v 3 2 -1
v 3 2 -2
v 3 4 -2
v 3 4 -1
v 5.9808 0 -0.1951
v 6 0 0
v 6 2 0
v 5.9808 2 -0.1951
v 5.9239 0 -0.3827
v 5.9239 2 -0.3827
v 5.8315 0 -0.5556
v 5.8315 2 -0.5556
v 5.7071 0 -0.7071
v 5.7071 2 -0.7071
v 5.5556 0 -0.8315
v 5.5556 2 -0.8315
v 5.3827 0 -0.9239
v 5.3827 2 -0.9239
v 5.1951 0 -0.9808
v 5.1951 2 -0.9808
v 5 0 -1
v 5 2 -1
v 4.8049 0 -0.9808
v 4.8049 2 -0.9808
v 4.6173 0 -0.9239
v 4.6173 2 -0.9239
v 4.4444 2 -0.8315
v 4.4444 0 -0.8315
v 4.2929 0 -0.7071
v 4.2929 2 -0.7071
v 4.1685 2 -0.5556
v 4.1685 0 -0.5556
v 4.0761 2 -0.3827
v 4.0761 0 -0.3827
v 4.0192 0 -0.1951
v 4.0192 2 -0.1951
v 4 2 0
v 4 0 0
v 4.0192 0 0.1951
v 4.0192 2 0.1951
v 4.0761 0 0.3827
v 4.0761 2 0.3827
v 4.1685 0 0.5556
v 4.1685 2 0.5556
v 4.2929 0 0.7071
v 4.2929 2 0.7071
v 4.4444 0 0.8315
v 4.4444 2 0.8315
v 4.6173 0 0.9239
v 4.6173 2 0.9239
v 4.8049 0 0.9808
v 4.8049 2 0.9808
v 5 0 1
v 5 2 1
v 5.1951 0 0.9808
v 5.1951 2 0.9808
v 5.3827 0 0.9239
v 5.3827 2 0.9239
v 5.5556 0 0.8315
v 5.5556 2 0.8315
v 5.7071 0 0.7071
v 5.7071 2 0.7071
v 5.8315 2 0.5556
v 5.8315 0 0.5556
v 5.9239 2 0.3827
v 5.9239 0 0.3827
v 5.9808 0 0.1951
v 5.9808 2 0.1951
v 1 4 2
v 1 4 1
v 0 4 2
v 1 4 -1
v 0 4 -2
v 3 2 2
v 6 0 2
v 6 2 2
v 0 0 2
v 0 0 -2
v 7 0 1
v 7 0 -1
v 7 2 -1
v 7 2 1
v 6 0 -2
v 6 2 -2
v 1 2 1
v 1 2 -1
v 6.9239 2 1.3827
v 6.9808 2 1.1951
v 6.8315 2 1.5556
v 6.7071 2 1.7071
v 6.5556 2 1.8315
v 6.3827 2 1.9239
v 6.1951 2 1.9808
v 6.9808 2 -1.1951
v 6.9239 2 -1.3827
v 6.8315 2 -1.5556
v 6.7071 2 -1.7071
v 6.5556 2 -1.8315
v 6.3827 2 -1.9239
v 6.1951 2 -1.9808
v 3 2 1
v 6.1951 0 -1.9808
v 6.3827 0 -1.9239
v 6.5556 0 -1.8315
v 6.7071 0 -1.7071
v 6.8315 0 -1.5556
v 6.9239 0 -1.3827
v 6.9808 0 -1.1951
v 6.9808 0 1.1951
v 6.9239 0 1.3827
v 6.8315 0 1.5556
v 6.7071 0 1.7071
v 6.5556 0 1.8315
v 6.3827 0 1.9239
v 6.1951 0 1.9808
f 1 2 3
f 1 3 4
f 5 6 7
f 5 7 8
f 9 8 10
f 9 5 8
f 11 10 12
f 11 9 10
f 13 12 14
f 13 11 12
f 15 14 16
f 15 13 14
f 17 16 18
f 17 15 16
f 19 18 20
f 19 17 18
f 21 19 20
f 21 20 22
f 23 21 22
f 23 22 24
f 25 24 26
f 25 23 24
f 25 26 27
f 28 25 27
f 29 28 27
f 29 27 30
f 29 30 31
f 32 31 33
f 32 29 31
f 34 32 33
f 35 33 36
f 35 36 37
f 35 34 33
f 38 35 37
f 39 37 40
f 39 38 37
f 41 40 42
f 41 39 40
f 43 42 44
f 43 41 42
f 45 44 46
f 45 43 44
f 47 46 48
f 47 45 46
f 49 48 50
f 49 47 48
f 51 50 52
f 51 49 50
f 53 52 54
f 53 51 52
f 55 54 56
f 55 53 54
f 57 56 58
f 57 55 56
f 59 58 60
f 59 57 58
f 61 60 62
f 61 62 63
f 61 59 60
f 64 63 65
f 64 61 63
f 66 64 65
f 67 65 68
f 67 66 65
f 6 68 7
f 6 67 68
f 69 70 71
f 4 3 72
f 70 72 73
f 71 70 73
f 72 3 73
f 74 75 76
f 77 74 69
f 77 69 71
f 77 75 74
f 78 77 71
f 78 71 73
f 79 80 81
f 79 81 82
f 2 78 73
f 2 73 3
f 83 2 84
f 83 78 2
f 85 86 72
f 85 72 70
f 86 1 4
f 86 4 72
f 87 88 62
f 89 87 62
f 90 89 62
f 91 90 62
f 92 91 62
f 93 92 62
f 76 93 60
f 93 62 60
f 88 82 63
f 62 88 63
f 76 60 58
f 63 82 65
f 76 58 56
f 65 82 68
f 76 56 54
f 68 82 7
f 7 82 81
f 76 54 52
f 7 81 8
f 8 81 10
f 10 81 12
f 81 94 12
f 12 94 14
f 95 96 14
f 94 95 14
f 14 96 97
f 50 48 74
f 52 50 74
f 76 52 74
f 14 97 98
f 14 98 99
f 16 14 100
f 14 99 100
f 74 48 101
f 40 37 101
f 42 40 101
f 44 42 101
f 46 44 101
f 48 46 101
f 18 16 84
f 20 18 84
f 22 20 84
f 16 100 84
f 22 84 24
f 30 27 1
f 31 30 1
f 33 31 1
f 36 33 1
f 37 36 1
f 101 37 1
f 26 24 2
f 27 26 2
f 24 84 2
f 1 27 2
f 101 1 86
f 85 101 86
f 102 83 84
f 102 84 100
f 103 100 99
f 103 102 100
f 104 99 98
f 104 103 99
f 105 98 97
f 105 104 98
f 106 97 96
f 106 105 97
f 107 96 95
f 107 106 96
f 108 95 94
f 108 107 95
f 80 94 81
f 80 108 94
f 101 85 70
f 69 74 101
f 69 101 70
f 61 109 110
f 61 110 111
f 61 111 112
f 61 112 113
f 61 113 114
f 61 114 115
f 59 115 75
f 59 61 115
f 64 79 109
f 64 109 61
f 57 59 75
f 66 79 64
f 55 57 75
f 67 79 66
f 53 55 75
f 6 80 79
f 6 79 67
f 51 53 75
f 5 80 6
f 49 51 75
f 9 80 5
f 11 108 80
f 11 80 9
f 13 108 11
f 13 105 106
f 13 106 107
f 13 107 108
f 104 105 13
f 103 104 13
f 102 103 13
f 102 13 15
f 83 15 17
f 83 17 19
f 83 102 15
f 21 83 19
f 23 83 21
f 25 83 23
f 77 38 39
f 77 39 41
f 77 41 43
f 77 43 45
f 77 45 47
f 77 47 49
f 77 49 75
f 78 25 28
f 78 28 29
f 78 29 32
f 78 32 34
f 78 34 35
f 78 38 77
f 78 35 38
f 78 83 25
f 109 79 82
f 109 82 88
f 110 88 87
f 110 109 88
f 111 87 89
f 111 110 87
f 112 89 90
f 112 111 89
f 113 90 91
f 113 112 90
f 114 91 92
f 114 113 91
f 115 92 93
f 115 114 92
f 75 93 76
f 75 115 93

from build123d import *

# Parameters (mm, degrees)
SKETCH_1_R          = 1
EXTRUDE_1_DEPTH     = 2
EXTRUDE_2_DEPTH     = 4
CUT_EXTRUDE_1_DEPTH = 1


with BuildPart() as part:
    # 草圖1 → 填料-伸長1 (new body)
    with BuildSketch(Plane(origin=(0, 0, 0), x_dir=(1, 0, 0), z_dir=(0, 1, 0))):
        with BuildLine():
            Line((0, -2), (0, 2))
            Line((0, 2), (6, 2))
            ThreePointArc((6, 2), (6.707106781, 1.707106781), (7, 1))
            Line((7, 1), (7, 0))
            Line((7, 0), (7, -1))
            ThreePointArc((7, -1), (6.707106781, -1.707106781), (6, -2))
            Line((6, -2), (0, -2))
        make_face()
        with Locations((5, 0)):
            Circle(SKETCH_1_R, mode=Mode.SUBTRACT)
    extrude(amount=EXTRUDE_1_DEPTH)

    # 草圖4 → 填料-伸長2 (add)
    with BuildSketch(Plane(origin=(0, 0, 0), x_dir=(1, 0, 0), z_dir=(0, 1, 0))):
        Polygon((0, 0), (0, 2), (3, 2), (3, 1), (1, 1), (1, -1), (3, -1), (3, -2), (0, -2), align=None)
    extrude(amount=EXTRUDE_2_DEPTH)

    # 草圖5 → 除料-伸長1 (cut)
    with BuildSketch(Plane.XY.offset(2)):
        Polygon((3, 2), (1, 4), (3, 4), align=None)
    extrude(amount=-CUT_EXTRUDE_1_DEPTH, mode=Mode.SUBTRACT)


solid = part.part
